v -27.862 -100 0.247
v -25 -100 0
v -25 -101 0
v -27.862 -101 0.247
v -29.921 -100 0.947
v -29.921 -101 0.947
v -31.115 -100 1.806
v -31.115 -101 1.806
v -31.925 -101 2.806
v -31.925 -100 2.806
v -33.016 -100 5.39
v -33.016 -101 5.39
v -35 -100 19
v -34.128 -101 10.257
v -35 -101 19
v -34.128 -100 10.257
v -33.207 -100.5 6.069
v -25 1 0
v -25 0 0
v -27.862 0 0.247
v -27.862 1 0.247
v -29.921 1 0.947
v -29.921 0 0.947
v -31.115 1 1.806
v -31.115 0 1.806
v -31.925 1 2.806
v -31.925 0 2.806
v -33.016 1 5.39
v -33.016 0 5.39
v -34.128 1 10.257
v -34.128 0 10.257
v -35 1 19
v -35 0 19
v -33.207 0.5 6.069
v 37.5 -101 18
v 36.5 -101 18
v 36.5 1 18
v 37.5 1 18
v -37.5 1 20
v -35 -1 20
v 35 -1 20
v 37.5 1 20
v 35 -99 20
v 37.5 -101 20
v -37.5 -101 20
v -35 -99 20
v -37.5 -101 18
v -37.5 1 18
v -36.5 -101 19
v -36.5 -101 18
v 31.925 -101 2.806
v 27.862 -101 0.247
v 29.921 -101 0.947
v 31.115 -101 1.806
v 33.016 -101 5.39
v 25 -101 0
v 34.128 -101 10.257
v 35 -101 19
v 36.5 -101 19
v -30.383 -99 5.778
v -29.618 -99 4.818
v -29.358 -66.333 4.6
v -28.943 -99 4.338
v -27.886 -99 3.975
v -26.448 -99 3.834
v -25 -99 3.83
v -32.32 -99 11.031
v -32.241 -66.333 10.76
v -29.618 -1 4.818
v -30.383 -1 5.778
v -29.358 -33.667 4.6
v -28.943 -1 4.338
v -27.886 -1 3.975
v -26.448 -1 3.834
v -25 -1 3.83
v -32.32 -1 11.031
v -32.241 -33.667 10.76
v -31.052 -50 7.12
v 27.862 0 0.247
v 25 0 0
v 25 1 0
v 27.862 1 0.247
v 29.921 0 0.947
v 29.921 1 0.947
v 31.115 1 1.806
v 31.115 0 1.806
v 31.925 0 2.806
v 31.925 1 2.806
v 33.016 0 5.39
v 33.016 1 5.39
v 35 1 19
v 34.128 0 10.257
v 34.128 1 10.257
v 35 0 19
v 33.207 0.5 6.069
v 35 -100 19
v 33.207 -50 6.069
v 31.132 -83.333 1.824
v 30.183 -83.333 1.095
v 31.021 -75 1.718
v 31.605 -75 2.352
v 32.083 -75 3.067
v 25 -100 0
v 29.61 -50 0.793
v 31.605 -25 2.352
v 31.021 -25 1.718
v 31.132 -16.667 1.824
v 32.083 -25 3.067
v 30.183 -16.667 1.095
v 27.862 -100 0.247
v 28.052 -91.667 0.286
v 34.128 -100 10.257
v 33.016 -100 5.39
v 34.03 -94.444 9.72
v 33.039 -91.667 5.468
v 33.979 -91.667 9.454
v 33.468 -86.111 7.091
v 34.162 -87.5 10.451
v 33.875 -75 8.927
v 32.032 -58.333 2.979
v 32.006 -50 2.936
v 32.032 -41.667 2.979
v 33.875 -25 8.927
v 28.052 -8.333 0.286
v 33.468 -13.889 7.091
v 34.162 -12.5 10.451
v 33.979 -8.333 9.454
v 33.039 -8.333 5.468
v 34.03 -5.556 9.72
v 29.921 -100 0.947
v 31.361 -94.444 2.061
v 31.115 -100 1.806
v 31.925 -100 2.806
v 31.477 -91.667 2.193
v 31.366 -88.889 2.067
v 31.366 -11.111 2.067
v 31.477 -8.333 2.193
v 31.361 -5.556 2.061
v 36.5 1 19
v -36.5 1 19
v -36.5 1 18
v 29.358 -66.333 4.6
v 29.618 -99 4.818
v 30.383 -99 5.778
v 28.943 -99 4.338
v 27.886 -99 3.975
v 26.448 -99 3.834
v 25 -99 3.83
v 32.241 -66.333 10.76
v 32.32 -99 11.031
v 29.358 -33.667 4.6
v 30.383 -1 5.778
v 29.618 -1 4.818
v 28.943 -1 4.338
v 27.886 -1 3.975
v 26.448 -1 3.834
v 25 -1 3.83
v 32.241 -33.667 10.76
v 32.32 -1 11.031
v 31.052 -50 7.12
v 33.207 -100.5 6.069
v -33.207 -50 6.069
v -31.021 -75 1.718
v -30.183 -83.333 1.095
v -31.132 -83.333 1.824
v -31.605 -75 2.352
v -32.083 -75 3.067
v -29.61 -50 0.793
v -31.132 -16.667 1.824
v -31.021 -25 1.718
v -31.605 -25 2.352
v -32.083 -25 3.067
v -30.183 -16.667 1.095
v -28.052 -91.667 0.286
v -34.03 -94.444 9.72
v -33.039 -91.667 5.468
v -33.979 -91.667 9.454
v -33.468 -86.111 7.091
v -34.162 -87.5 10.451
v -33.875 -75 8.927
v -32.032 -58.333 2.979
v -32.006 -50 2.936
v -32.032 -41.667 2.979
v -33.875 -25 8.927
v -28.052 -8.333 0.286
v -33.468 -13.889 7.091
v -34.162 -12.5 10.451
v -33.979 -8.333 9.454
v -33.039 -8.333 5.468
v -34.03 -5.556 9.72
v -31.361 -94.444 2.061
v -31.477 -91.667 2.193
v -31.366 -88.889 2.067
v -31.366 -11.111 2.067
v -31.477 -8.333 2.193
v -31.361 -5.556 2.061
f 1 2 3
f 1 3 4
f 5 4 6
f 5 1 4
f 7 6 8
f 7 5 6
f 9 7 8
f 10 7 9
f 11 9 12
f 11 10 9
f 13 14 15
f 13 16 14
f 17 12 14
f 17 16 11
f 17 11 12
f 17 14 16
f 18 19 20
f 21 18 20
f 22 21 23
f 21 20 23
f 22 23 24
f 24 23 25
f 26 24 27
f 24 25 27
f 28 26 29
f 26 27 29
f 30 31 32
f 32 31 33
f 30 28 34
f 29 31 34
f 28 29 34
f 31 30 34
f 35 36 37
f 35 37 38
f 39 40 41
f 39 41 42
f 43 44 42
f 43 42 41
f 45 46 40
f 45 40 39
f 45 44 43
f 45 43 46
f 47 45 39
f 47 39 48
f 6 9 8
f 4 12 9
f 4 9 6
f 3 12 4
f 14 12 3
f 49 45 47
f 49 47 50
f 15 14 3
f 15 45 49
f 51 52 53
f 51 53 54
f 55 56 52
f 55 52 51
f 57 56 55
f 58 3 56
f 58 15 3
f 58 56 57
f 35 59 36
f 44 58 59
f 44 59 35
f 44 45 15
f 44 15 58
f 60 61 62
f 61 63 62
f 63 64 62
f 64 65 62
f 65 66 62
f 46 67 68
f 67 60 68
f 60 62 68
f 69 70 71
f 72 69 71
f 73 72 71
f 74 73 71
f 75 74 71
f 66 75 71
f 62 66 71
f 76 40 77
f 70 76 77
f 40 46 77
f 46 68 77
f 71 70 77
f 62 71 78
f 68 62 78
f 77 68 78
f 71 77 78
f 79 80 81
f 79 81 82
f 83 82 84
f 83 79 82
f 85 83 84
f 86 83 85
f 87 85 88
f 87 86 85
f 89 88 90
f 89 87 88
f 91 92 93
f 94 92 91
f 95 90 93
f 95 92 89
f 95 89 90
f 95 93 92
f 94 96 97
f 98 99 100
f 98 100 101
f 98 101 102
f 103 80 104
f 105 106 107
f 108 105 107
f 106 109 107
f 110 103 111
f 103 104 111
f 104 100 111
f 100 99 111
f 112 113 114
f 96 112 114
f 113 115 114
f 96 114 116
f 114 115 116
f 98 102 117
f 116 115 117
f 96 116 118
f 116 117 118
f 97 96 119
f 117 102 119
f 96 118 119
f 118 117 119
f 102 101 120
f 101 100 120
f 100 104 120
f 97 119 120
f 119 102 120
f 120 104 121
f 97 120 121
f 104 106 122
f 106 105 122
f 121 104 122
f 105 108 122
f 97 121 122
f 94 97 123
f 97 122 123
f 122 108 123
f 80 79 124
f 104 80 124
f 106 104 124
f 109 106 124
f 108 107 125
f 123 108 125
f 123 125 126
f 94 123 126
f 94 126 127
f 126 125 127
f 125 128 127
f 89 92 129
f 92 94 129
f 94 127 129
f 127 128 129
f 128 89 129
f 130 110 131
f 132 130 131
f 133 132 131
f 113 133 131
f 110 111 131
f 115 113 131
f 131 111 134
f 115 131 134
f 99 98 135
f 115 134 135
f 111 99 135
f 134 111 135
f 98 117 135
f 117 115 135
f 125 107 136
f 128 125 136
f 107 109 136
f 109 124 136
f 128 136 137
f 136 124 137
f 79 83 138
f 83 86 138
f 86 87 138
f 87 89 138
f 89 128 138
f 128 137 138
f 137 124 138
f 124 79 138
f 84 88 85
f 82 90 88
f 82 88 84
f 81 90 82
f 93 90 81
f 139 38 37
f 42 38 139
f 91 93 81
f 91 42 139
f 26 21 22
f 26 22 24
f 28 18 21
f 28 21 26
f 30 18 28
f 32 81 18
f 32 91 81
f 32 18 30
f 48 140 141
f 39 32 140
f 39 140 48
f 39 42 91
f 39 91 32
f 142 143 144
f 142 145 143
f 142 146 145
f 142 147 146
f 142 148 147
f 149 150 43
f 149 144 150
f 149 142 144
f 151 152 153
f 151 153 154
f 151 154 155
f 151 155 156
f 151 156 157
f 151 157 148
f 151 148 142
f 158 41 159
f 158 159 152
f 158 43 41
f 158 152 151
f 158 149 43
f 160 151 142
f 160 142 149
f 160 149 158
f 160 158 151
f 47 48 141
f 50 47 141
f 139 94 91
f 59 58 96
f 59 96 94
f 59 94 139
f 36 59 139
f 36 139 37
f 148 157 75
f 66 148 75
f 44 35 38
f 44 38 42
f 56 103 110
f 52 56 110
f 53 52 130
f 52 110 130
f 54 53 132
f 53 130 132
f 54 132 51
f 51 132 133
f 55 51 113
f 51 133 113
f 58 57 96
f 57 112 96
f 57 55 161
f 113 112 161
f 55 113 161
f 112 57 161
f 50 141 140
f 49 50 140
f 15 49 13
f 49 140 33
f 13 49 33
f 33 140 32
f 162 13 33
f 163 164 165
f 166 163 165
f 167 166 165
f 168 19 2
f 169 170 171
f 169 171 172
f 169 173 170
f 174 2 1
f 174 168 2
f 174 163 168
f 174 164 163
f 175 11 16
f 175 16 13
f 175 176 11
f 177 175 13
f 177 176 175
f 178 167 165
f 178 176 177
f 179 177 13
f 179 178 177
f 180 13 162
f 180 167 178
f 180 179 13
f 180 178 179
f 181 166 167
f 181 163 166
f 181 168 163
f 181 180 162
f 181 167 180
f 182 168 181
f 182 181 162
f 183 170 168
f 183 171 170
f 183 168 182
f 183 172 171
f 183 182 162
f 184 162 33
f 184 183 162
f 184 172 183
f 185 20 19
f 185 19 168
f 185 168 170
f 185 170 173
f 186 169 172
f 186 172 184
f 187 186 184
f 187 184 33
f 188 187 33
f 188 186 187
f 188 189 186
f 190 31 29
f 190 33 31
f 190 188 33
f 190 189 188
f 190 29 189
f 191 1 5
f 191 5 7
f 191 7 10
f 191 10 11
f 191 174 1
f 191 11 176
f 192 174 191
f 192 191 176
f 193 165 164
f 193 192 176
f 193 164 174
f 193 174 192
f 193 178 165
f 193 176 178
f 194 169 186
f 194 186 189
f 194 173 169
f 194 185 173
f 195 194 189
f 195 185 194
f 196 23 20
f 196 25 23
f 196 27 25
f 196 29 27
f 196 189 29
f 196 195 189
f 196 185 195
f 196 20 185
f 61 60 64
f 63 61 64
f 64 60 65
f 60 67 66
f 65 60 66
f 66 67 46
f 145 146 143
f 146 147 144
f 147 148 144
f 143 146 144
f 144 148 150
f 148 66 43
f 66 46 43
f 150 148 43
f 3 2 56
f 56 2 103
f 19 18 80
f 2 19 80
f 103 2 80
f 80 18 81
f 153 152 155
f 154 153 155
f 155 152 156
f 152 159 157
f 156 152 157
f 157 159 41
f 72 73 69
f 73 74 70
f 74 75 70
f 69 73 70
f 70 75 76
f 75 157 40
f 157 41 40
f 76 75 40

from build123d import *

# Parameters (mm, degrees)
F0_W     = 1
F0_H     = 1
F1_DEPTH = 100
F3_DEPTH = 1


with BuildPart() as f1:
    # F0 (on Front) → F1 (new body)
    with BuildSketch(Plane.XZ):
        with BuildLine():
            add(Edge.make_bspline(
                [(-25, 0), (-31.0571533825, 0), (-33.5724792203, 5.3372634662), (-34.9458986693, 14.8072108202), (-35, 19)],
                knots=[0, 0, 0, 0, 0.4601745269, 0.959678351, 0.959678351, 0.959678351, 0.959678351], degree=3))
            Line((-25, 0), (0, 0))
            Line((0, 0), (25, 0))
            add(Edge.make_bspline(
                [(25, 0), (31.0571533825, 0), (33.5724792203, 5.3372634662), (34.9458986693, 14.8072108202), (35, 19)],
                knots=[0, 0, 0, 0, 0.4601745269, 0.959678351, 0.959678351, 0.959678351, 0.959678351], degree=3))
            add(Edge.make_bspline(
                [(35, 19), (35.0043672436, 19.338456215), (35.0044288568, 19.672114945), (35, 20)],
                knots=[0.959678351, 0.959678351, 0.959678351, 0.959678351, 1, 1, 1, 1], degree=3))
            add(Edge.make_bspline(
                [(25, 3.8304927293), (26.6068548069, 3.8304927293), (30.2022112297, 3.6251652991), (32.3451633939, 11.2127971956), (34.0650589972, 16.9015645999), (35, 20)],
                knots=[0, 0, 0, 0, 0.2691210669, 0.6027369485, 1, 1, 1, 1], degree=3))
            Line((25, 3.8304927293), (0, 3.8304927293))
            Line((0, 3.8304927293), (-25, 3.8304927293))
            add(Edge.make_bspline(
                [(-25, 3.8304927293), (-26.6068548069, 3.8304927293), (-30.2022112297, 3.6251652991), (-32.3451633939, 11.2127971956), (-34.0650589972, 16.9015645999), (-35, 20)],
                knots=[0, 0, 0, 0, 0.2691210669, 0.6027369485, 1, 1, 1, 1], degree=3))
            add(Edge.make_bspline(
                [(-35, 19), (-35.0043672436, 19.338456215), (-35.0044288568, 19.672114945), (-35, 20)],
                knots=[0.959678351, 0.959678351, 0.959678351, 0.959678351, 1, 1, 1, 1], degree=3))
        make_face()
        with BuildLine():
            Line((-36.5, 19), (-35, 19))
            add(Edge.make_bspline(
                [(-35, 19), (-35.0043672436, 19.338456215), (-35.0044288568, 19.672114945), (-35, 20)],
                knots=[0.959678351, 0.959678351, 0.959678351, 0.959678351, 1, 1, 1, 1], degree=3))
            Line((-35, 20), (-37.5, 20))
            Line((-37.5, 20), (-37.5, 19))
            Line((-37.5, 19), (-36.5, 19))
        make_face()
        with BuildLine():
            add(Edge.make_bspline(
                [(35, 19), (35.0043672436, 19.338456215), (35.0044288568, 19.672114945), (35, 20)],
                knots=[0.959678351, 0.959678351, 0.959678351, 0.959678351, 1, 1, 1, 1], degree=3))
            Line((35, 19), (36.5, 19))
            Line((36.5, 19), (37.5, 19))
            Line((37.5, 19), (37.5, 20))
            Line((37.5, 20), (35, 20))
        make_face()
        with Locations((-37, 18.5)):
            Rectangle(F0_W, F0_H)
        with Locations((37, 18.5)):
            Rectangle(F0_W, F0_H)
    extrude(amount=F1_DEPTH)

    # F1_face (on face) + F0 (on Front) + F2 (on face) → F3 (join, symmetric)
    with BuildSketch(Plane(origin=(0, -100, 3.8022780085), x_dir=(1, 0, 0), z_dir=(0, -1, 0))):
        with BuildLine():
            Line((25, 0.0282147208), (-25, 0.0282147208))
            add(Edge.make_bspline(
                [(-25, 0.0282147208), (-26.6068548069, 0.0282147208), (-30.2022112297, -0.1771127094), (-32.3451633939, 7.4105191871), (-34.0650589972, 13.0992865914), (-35, 16.1977219915)],
                knots=[0, 0, 0, 0, 0.2691210669, 0.6027369485, 1, 1, 1, 1], degree=3))
            Line((-35, 16.1977219915), (-37.5, 16.1977219915))
            Line((-37.5, 16.1977219915), (-37.5, 14.1977219915))
            Line((-37.5, 14.1977219915), (-36.5, 14.1977219915))
            Line((-36.5, 14.1977219915), (-36.5, 15.1977219915))
            Line((-36.5, 15.1977219915), (-35, 15.1977219915))
            add(Edge.make_bspline(
                [(-25, -3.8022780085), (-31.0571533825, -3.8022780085), (-33.5724792203, 1.5349854577), (-34.9458986693, 11.0049328117), (-35, 15.1977219915)],
                knots=[0, 0, 0, 0, 0.4601745269, 0.959678351, 0.959678351, 0.959678351, 0.959678351], degree=3))
            Line((-25, -3.8022780085), (25, -3.8022780085))
            add(Edge.make_bspline(
                [(25, -3.8022780085), (31.0571533825, -3.8022780085), (33.5724792203, 1.5349854577), (34.9458986693, 11.0049328117), (35, 15.1977219915)],
                knots=[0, 0, 0, 0, 0.4601745269, 0.959678351, 0.959678351, 0.959678351, 0.959678351], degree=3))
            Line((35, 15.1977219915), (36.5, 15.1977219915))
            Line((36.5, 15.1977219915), (36.5, 14.1977219915))
            Line((36.5, 14.1977219915), (37.5, 14.1977219915))
            Line((37.5, 14.1977219915), (37.5, 16.1977219915))
            Line((37.5, 16.1977219915), (35, 16.1977219915))
            add(Edge.make_bspline(
                [(25, 0.0282147208), (26.6068548069, 0.0282147208), (30.2022112297, -0.1771127094), (32.3451633939, 7.4105191871), (34.0650589972, 13.0992865914), (35, 16.1977219915)],
                knots=[0, 0, 0, 0, 0.2691210669, 0.6027369485, 1, 1, 1, 1], degree=3))
        make_face()
    with BuildSketch(Plane.XZ):
        with BuildLine():
            add(Edge.make_bspline(
                [(-25, 0), (-31.0571533825, 0), (-33.5724792203, 5.3372634662), (-34.9458986693, 14.8072108202), (-35, 19)],
                knots=[0, 0, 0, 0, 0.4601745269, 0.959678351, 0.959678351, 0.959678351, 0.959678351], degree=3))
            Line((-25, 0), (0, 0))
            Line((0, 0), (25, 0))
            add(Edge.make_bspline(
                [(25, 0), (31.0571533825, 0), (33.5724792203, 5.3372634662), (34.9458986693, 14.8072108202), (35, 19)],
                knots=[0, 0, 0, 0, 0.4601745269, 0.959678351, 0.959678351, 0.959678351, 0.959678351], degree=3))
            add(Edge.make_bspline(
                [(35, 19), (35.0043672436, 19.338456215), (35.0044288568, 19.672114945), (35, 20)],
                knots=[0.959678351, 0.959678351, 0.959678351, 0.959678351, 1, 1, 1, 1], degree=3))
            add(Edge.make_bspline(
                [(25, 3.8304927293), (26.6068548069, 3.8304927293), (30.2022112297, 3.6251652991), (32.3451633939, 11.2127971956), (34.0650589972, 16.9015645999), (35, 20)],
                knots=[0, 0, 0, 0, 0.2691210669, 0.6027369485, 1, 1, 1, 1], degree=3))
            Line((25, 3.8304927293), (0, 3.8304927293))
            Line((0, 3.8304927293), (-25, 3.8304927293))
            add(Edge.make_bspline(
                [(-25, 3.8304927293), (-26.6068548069, 3.8304927293), (-30.2022112297, 3.6251652991), (-32.3451633939, 11.2127971956), (-34.0650589972, 16.9015645999), (-35, 20)],
                knots=[0, 0, 0, 0, 0.2691210669, 0.6027369485, 1, 1, 1, 1], degree=3))
            add(Edge.make_bspline(
                [(-35, 19), (-35.0043672436, 19.338456215), (-35.0044288568, 19.672114945), (-35, 20)],
                knots=[0.959678351, 0.959678351, 0.959678351, 0.959678351, 1, 1, 1, 1], degree=3))
        make_face()
        with BuildLine():
            Line((-36.5, 19), (-35, 19))
            add(Edge.make_bspline(
                [(-35, 19), (-35.0043672436, 19.338456215), (-35.0044288568, 19.672114945), (-35, 20)],
                knots=[0.959678351, 0.959678351, 0.959678351, 0.959678351, 1, 1, 1, 1], degree=3))
            Line((-35, 20), (-37.5, 20))
            Line((-37.5, 20), (-37.5, 19))
            Line((-37.5, 19), (-36.5, 19))
        make_face()
        with BuildLine():
            Line((35, 20), (-35, 20))
            add(Edge.make_bspline(
                [(-25, 3.8304927293), (-26.6068548069, 3.8304927293), (-30.2022112297, 3.6251652991), (-32.3451633939, 11.2127971956), (-34.0650589972, 16.9015645999), (-35, 20)],
                knots=[0, 0, 0, 0, 0.2691210669, 0.6027369485, 1, 1, 1, 1], degree=3))
            Line((-25, 3.8304927293), (0, 3.8304927293))
            Line((0, 3.8304927293), (25, 3.8304927293))
            add(Edge.make_bspline(
                [(25, 3.8304927293), (26.6068548069, 3.8304927293), (30.2022112297, 3.6251652991), (32.3451633939, 11.2127971956), (34.0650589972, 16.9015645999), (35, 20)],
                knots=[0, 0, 0, 0, 0.2691210669, 0.6027369485, 1, 1, 1, 1], degree=3))
        make_face()
        with Locations((-37, 18.5)):
            Rectangle(F0_W, F0_H)
        with BuildLine():
            add(Edge.make_bspline(
                [(35, 19), (35.0043672436, 19.338456215), (35.0044288568, 19.672114945), (35, 20)],
                knots=[0.959678351, 0.959678351, 0.959678351, 0.959678351, 1, 1, 1, 1], degree=3))
            Line((35, 19), (36.5, 19))
            Line((36.5, 19), (37.5, 19))
            Line((37.5, 19), (37.5, 20))
            Line((37.5, 20), (35, 20))
        make_face()
        with Locations((37, 18.5)):
            Rectangle(F0_W, F0_H)
    with BuildSketch(Plane.XZ.offset(100)):
        with BuildLine():
            Line((35, 20), (-35, 20))
            add(Edge.make_bspline(
                [(-25, 3.8304927293), (-26.6068548069, 3.8304927293), (-30.2022112297, 3.6251652991), (-32.3451633939, 11.2127971956), (-34.0650589972, 16.9015645999), (-35, 20)],
                knots=[0, 0, 0, 0, 0.2691210669, 0.6027369485, 1, 1, 1, 1], degree=3))
            Line((-25, 3.8304927293), (25, 3.8304927293))
            add(Edge.make_bspline(
                [(25, 3.8304927293), (26.6068548069, 3.8304927293), (30.2022112297, 3.6251652991), (32.3451633939, 11.2127971956), (34.0650589972, 16.9015645999), (35, 20)],
                knots=[0, 0, 0, 0, 0.2691210669, 0.6027369485, 1, 1, 1, 1], degree=3))
        make_face()
    extrude(amount=F3_DEPTH, both=True)


solid = f1.part
